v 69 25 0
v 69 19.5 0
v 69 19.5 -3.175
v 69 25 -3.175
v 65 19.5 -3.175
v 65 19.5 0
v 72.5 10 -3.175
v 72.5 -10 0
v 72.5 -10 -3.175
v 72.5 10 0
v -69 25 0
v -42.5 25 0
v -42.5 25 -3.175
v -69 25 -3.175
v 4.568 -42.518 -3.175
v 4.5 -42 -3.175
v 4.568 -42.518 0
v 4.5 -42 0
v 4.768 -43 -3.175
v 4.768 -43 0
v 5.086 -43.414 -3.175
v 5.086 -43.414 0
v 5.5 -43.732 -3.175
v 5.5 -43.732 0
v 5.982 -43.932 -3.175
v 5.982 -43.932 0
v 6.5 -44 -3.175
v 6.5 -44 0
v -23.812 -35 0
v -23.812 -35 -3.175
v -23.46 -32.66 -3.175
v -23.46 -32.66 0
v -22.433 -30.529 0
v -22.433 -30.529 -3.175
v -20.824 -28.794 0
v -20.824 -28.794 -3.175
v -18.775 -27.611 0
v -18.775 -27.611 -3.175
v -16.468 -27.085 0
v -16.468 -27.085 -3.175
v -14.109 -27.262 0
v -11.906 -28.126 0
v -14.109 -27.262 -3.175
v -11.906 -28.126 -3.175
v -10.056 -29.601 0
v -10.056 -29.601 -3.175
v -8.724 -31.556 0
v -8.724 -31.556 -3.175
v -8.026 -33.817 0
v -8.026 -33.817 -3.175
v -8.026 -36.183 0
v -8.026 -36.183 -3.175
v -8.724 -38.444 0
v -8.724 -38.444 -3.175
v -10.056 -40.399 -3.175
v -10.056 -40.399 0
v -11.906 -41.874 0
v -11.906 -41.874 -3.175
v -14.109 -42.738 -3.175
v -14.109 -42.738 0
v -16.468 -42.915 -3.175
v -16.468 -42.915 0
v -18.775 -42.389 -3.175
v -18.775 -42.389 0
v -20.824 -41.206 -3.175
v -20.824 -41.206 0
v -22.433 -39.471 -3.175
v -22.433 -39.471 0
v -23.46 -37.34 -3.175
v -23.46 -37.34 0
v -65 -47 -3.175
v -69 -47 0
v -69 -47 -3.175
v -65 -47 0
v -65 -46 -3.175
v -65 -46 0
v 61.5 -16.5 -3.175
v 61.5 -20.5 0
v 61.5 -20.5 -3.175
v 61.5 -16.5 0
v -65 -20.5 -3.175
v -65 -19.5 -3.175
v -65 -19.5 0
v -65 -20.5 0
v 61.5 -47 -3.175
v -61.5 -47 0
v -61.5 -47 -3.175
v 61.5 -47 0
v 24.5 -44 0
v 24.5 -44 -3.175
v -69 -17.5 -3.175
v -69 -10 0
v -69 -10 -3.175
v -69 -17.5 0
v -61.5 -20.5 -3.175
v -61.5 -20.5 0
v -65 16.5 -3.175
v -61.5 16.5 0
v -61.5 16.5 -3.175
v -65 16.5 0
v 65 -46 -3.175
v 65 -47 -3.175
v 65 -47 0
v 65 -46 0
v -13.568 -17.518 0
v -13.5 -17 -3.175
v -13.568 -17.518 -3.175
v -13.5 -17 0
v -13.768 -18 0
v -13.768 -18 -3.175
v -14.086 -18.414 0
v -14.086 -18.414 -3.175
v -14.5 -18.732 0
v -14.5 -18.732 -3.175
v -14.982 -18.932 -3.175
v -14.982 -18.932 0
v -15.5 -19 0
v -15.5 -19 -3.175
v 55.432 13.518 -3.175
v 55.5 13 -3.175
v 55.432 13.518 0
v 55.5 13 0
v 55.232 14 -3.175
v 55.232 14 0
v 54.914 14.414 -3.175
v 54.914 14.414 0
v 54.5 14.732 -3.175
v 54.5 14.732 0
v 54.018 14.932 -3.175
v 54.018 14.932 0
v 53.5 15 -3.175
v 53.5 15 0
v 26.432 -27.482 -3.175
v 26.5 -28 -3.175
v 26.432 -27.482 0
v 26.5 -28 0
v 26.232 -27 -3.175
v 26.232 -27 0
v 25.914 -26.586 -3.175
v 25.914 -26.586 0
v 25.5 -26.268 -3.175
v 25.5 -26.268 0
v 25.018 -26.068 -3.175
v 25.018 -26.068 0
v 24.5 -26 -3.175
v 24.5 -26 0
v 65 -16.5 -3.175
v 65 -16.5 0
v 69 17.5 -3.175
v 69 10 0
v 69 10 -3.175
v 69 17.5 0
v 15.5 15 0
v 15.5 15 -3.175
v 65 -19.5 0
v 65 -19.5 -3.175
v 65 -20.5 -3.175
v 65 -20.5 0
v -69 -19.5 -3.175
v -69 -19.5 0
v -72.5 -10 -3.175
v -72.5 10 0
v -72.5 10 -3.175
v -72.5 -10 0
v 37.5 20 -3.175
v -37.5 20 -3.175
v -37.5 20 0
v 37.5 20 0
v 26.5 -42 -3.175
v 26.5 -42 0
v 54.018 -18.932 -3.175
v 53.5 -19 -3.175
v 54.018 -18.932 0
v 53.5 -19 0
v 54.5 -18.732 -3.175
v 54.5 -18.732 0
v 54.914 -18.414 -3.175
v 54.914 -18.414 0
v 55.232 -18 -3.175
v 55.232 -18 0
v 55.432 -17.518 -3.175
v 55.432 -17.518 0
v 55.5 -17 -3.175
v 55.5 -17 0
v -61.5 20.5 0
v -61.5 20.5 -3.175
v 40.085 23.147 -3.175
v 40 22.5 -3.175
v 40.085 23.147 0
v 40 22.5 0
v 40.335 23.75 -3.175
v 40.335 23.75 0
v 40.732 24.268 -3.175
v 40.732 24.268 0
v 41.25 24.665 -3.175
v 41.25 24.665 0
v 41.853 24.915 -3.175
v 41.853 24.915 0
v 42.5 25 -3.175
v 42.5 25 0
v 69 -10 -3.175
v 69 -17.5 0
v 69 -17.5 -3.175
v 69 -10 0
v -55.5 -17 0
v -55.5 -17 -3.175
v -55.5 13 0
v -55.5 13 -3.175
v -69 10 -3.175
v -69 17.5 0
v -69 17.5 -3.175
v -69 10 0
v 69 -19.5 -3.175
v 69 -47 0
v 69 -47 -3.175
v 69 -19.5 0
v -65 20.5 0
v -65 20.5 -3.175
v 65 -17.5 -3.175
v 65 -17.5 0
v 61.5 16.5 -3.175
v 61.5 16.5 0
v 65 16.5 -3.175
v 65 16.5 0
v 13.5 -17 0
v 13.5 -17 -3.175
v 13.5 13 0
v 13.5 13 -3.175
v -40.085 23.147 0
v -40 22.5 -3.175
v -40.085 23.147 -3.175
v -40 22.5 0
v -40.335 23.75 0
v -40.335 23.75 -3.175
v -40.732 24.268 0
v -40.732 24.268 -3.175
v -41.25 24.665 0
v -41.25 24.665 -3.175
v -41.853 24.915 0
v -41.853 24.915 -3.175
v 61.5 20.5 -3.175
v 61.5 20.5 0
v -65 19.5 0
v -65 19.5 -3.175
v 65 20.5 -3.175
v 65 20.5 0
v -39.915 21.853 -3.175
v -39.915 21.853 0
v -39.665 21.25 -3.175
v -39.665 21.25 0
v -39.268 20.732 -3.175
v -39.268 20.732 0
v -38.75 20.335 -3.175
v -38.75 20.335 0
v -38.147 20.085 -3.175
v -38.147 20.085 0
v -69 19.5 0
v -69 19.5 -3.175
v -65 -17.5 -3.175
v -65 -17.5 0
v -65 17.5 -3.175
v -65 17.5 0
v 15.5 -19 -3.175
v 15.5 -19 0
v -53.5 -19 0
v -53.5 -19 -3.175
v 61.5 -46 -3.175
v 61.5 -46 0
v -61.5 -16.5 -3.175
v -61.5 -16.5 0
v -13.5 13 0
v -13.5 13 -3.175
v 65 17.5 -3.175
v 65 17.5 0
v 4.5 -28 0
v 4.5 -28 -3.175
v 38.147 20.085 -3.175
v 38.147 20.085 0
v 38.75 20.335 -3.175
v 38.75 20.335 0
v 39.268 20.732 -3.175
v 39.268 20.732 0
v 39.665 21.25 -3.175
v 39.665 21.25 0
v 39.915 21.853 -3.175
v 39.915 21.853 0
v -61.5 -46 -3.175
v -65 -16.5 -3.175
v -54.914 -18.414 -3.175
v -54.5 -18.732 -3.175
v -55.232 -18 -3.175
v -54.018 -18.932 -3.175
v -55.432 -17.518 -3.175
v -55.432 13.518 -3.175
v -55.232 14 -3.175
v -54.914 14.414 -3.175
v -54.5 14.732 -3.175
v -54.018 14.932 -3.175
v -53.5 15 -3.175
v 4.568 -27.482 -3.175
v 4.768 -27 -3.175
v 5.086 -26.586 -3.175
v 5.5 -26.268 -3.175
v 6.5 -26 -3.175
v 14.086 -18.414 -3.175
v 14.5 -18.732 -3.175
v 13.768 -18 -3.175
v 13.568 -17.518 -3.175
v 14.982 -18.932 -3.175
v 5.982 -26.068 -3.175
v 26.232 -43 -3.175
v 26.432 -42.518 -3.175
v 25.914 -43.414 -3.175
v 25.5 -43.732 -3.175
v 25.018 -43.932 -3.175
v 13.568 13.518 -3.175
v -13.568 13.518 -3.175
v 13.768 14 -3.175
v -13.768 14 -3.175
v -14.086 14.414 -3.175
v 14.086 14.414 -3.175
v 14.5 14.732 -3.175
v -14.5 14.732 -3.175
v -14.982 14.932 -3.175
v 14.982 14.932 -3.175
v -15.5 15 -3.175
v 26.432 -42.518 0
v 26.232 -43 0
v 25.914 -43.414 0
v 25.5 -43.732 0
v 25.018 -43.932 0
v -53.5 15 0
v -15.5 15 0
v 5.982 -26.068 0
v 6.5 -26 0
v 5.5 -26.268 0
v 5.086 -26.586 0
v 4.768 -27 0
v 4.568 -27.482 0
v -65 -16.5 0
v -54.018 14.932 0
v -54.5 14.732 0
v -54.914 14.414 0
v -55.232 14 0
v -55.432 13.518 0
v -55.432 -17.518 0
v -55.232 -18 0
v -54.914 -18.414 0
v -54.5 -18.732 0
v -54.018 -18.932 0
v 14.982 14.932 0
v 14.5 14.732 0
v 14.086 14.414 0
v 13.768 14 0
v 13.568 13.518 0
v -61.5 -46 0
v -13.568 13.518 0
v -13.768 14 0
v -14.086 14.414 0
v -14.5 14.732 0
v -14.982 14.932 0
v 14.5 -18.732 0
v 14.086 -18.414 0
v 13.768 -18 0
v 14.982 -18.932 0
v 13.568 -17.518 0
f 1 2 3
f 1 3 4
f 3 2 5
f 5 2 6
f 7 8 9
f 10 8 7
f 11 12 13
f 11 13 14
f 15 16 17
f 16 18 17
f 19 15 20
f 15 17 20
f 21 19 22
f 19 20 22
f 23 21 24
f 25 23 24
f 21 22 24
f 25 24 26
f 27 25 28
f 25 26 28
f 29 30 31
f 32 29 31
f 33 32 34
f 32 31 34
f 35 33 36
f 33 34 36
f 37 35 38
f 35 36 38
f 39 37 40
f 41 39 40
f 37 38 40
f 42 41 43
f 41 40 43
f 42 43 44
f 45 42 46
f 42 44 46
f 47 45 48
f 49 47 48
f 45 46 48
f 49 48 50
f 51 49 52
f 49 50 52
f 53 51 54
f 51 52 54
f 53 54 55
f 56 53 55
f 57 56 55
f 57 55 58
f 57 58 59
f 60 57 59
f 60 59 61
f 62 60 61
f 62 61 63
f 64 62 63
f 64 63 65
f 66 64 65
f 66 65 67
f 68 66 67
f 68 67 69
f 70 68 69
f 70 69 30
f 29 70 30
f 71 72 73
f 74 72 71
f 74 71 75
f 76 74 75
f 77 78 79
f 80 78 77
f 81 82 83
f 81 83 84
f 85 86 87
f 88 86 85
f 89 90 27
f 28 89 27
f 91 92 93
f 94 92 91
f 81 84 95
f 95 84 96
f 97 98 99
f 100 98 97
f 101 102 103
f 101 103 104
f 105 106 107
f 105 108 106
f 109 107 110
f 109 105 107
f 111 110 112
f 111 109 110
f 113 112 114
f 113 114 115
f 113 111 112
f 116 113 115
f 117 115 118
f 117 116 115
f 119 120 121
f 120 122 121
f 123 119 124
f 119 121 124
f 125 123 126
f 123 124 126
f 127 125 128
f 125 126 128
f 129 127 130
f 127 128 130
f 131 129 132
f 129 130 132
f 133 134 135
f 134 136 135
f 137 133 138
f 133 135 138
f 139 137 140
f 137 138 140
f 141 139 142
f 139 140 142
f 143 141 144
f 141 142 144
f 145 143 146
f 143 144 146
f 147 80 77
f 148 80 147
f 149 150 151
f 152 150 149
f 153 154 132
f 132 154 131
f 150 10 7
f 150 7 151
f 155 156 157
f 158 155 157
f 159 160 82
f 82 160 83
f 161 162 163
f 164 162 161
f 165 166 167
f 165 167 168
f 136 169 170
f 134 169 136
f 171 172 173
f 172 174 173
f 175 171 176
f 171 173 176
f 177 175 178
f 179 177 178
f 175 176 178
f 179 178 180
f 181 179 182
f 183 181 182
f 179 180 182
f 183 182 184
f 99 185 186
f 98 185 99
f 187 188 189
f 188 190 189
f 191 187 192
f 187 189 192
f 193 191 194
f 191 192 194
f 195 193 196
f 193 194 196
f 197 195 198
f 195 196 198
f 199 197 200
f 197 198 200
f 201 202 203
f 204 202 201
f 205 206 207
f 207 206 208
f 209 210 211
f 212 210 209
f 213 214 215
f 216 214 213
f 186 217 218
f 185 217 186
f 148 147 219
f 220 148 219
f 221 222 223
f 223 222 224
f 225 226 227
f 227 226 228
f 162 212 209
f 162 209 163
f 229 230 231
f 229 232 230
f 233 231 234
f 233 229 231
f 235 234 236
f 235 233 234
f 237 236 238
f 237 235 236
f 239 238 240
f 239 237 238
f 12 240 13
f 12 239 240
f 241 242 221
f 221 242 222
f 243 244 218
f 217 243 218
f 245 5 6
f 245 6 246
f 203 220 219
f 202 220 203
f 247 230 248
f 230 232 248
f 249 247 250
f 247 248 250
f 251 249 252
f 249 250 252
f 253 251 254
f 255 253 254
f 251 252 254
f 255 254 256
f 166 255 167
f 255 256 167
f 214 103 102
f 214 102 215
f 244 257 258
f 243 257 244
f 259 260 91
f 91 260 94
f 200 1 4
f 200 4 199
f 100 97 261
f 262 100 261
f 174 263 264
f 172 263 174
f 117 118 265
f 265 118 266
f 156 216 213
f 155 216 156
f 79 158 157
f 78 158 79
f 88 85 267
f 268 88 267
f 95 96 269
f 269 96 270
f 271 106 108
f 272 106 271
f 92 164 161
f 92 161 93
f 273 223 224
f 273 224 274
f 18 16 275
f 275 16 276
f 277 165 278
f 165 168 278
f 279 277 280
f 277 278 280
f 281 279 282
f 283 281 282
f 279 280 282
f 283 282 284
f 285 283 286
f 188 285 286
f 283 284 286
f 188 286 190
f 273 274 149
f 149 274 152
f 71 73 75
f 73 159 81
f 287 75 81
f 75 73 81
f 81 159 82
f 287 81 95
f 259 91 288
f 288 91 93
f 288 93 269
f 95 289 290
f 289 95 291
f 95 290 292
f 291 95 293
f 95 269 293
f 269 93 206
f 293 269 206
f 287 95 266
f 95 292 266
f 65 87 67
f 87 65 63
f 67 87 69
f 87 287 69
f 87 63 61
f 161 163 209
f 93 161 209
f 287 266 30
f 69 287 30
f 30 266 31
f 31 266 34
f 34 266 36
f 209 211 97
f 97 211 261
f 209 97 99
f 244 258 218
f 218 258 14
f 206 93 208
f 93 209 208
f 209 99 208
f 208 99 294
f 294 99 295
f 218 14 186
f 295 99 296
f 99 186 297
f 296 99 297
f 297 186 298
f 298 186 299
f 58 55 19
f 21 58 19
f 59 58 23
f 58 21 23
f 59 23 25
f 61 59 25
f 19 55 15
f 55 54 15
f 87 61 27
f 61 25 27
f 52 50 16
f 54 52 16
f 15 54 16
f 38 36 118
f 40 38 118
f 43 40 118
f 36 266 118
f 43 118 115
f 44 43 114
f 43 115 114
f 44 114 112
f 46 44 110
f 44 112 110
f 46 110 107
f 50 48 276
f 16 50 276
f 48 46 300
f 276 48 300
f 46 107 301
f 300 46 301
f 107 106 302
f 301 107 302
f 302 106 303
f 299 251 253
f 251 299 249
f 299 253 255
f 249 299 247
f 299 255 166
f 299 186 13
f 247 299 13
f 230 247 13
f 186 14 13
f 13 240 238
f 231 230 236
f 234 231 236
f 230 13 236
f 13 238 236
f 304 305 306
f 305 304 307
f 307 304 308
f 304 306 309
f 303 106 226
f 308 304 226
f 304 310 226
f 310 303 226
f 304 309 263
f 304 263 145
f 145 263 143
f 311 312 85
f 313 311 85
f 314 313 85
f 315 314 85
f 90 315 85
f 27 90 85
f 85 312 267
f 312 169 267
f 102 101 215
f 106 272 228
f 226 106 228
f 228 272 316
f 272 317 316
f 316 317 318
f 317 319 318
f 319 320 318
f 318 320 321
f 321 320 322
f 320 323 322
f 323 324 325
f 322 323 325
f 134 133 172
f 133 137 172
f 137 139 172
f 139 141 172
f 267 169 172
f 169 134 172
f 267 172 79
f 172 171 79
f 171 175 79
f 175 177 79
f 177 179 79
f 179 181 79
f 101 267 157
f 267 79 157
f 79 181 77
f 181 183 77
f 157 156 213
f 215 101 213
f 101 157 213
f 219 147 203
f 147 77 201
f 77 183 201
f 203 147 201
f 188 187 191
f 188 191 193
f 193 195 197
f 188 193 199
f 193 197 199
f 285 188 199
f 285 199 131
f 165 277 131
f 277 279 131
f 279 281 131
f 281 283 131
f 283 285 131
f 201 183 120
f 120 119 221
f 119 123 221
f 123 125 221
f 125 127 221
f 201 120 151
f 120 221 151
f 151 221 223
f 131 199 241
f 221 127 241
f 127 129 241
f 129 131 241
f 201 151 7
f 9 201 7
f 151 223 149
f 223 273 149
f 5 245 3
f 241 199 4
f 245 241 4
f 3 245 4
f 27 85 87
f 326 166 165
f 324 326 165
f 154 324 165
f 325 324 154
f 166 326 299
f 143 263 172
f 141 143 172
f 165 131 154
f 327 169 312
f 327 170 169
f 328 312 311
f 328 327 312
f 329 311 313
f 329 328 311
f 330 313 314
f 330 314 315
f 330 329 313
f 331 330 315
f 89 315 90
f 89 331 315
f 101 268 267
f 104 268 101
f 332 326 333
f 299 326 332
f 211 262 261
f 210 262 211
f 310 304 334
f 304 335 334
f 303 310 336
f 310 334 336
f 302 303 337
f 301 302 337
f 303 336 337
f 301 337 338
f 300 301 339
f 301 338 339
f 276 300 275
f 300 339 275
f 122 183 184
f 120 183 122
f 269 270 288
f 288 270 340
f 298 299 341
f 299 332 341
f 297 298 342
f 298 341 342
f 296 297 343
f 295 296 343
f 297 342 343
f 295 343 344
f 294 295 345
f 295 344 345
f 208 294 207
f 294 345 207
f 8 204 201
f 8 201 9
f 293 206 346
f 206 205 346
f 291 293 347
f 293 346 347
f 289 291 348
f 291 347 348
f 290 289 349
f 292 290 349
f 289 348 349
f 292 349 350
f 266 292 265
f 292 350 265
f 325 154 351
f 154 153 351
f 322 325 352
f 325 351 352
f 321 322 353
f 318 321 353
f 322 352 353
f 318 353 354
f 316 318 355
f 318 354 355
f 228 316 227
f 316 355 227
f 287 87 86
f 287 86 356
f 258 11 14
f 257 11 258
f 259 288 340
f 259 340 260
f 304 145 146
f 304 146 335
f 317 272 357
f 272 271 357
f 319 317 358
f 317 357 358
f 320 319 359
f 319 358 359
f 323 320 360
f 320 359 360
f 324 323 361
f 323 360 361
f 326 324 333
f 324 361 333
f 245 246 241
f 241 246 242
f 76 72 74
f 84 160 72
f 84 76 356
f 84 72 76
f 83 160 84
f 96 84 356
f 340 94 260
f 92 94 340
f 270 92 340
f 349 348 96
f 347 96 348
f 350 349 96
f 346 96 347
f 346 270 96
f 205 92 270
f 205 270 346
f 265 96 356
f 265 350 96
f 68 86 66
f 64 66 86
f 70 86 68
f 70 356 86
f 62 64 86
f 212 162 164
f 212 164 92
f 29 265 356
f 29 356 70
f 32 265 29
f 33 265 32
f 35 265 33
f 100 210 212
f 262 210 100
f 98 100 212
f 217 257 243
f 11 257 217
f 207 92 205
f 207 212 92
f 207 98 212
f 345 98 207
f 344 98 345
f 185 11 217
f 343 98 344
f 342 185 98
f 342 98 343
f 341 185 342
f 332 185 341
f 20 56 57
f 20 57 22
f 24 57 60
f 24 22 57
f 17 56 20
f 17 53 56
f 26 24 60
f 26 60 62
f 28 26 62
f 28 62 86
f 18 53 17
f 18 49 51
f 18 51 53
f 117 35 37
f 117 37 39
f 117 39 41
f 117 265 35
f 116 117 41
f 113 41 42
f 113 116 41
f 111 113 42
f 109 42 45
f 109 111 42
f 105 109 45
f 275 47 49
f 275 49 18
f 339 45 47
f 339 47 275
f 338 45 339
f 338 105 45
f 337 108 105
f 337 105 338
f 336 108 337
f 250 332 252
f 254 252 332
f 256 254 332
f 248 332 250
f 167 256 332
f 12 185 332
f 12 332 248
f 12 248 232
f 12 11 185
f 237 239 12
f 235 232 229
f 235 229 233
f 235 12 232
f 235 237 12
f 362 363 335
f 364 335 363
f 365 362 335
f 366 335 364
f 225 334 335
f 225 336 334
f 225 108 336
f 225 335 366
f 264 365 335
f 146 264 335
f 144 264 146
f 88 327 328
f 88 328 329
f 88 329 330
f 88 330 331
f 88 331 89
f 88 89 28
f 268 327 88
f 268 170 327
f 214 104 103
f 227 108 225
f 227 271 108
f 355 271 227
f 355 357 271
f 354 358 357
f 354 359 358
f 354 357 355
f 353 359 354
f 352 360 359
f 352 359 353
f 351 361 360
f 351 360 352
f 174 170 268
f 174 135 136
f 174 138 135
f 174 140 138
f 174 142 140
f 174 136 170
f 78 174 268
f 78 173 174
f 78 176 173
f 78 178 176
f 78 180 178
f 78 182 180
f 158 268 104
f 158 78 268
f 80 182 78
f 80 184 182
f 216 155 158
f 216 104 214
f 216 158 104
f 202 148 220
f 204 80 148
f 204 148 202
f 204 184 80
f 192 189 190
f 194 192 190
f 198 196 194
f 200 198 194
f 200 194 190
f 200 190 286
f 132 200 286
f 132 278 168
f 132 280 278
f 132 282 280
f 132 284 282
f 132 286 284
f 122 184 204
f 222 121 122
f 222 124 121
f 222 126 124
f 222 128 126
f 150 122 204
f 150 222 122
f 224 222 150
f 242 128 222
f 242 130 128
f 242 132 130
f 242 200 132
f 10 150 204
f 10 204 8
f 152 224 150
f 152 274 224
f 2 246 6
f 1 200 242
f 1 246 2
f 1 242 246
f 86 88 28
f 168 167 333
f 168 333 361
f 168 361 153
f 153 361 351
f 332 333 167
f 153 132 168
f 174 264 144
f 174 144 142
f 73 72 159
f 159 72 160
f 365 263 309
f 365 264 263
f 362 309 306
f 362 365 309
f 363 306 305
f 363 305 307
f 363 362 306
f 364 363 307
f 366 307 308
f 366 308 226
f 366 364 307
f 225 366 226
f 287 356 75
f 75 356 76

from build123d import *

# Parameters (mm, degrees)
BOSS_EXTRUDE1_DEPTH     = 3.175
CUT_EXTRUDE1_DEPTH      = 82.916607748
MIRROR2_COPY_1_DEPTH    = 82.916607748
SKETCH4_W               = 138
SKETCH4_H               = 9
BOSS_EXTRUDE3_DEPTH     = 3.175
CUT_EXTRUDE2_DEPTH      = 87.459994362
CUT_EXTRUDE2_DEPTH_BACK = 87.459994362
SKETCH5_W               = 80
SKETCH5_H               = 5
FILLET1_R               = 2.5
SKETCH6_W               = 3.5
SKETCH6_H               = 1
CUT_EXTRUDE3_DEPTH      = 87.459994362
SKETCH10_W              = 42
SKETCH10_H              = 34
CUT_EXTRUDE4_DEPTH      = 87.459994362
FILLET2_R               = 2
FILLET2_OF_MIRROR4_R    = 2
SKETCH11_R              = 7.9375
CUT_EXTRUDE5_DEPTH      = 10
SKETCH12_W              = 22
SKETCH12_H              = 18
CUT_EXTRUDE6_DEPTH      = 10
FILLET3_R               = 2


with BuildPart() as part:
    # Sketch1 → Boss-Extrude1 (new body)
    with BuildSketch(Plane.XY):
        Polygon((-69, -10), (-69, -38), (69, -38), (69, -10), (72.5, -10), (72.5, 10), (69, 10), (69, 25), (-69, 25), (-69, 10), (-72.5, 10), (-72.5, -10), align=None)
    extrude(amount=-BOSS_EXTRUDE1_DEPTH)

    # Sketch2 → Cut-Extrude1 (cut, symmetric)
    with BuildSketch(Plane.XY):
        Polygon((-69, 19.5), (-65, 19.5), (-65, 20.5), (-61.5, 20.5), (-61.5, 16.5), (-65, 16.5), (-65, 17.5), (-69, 17.5), align=None)
    cut_extrude1 = extrude(amount=CUT_EXTRUDE1_DEPTH, both=True, mode=Mode.SUBTRACT)

    # Mirror1: Cut-Extrude1 across plane
    add(cut_extrude1.mirror(Plane.ZY), mode=Mode.SUBTRACT)

    # Mirror2: Cut-Extrude1 across plane
    add(cut_extrude1.mirror(Plane.ZX), mode=Mode.SUBTRACT)

    # Mirror2 copy 1 sketch → Mirror2 copy 1 (cut, symmetric)
    with BuildSketch(Plane(origin=(0, 0, 0), x_dir=(-1, 0, 0), z_dir=(0, 0, 1))):
        Polygon((-69, 19.5), (-65, 19.5), (-65, 20.5), (-61.5, 20.5), (-61.5, 16.5), (-65, 16.5), (-65, 17.5), (-69, 17.5), align=None)
    extrude(amount=MIRROR2_COPY_1_DEPTH, both=True, mode=Mode.SUBTRACT)

    # Sketch4 → Boss-Extrude3 (add)
    with BuildSketch(Plane.XY):
        with Locations((0, -42.5)):
            Rectangle(SKETCH4_W, SKETCH4_H)
    extrude(amount=-BOSS_EXTRUDE3_DEPTH)

    # Sketch5 → Cut-Extrude2 (cut, two sides: drawn at the far end of the back side and taken through both)
    with BuildSketch(Plane.XY.offset(-CUT_EXTRUDE2_DEPTH_BACK)):
        with Locations((0, 22.5)):
            Rectangle(SKETCH5_W, SKETCH5_H)
    extrude(amount=CUT_EXTRUDE2_DEPTH + CUT_EXTRUDE2_DEPTH_BACK, mode=Mode.SUBTRACT)

    # Fillet1
    fillet1_edges = [part.edges().sort_by_distance(p)[0] for p in [
        (40, 20, -1.5875),
        (-40, 20, -1.5875),
    ]]
    fillet(fillet1_edges, radius=FILLET1_R)
    fillet1_2_edges = [part.edges().sort_by_distance(p)[0] for p in [
        (40, 25, -1.5875),
        (-40, 25, -1.5875),
    ]]
    fillet(fillet1_2_edges, radius=FILLET1_R - 0.0001)  # a hair under: the kernel refuses the full size

    # Sketch6 → Cut-Extrude3 (cut, symmetric)
    with BuildSketch(Plane.XY):
        with Locations((63.25, -46.5)):
            Rectangle(SKETCH6_W, SKETCH6_H)
    cut_extrude3 = extrude(amount=CUT_EXTRUDE3_DEPTH, both=True, mode=Mode.SUBTRACT)

    # Mirror3: Cut-Extrude3 across plane
    add(cut_extrude3.mirror(Plane.ZY), mode=Mode.SUBTRACT)

    # Sketch10 → Cut-Extrude4 (cut, through all)
    with BuildSketch(Plane(origin=(0, 0, -3.175), x_dir=(-1, 0, 0), z_dir=(0, 0, -1))):
        with Locations((34.5, -2)):
            Rectangle(SKETCH10_W, SKETCH10_H)
    cut_extrude4 = extrude(amount=-CUT_EXTRUDE4_DEPTH, mode=Mode.SUBTRACT)

    # Fillet2
    fillet2_edges = [part.edges().sort_by_distance(p)[0] for p in [
        (-55.5, 15, -1.5875),
        (-55.5, -19, -1.5875),
        (-13.5, -19, -1.5875),
        (-13.5, 15, -1.5875),
    ]]
    fillet(fillet2_edges, radius=FILLET2_R)

    # Mirror4: Cut-Extrude4 across plane
    add(cut_extrude4.mirror(Plane.ZY), mode=Mode.SUBTRACT)

    # Fillet2 of Mirror4
    fillet2_of_mirror4_edges = [part.edges().sort_by_distance(p)[0] for p in [
        (55.5, 15, -1.5875),
        (55.5, -19, -1.5875),
        (13.5, -19, -1.5875),
        (13.5, 15, -1.5875),
    ]]
    fillet(fillet2_of_mirror4_edges, radius=FILLET2_OF_MIRROR4_R)

    # Sketch11 → Cut-Extrude5 (cut)
    with BuildSketch(Plane(origin=(0, 0, -3.175), x_dir=(-1, 0, 0), z_dir=(0, 0, -1))):
        with Locations((15.875, -35)):
            Circle(SKETCH11_R)
    extrude(amount=-CUT_EXTRUDE5_DEPTH, mode=Mode.SUBTRACT)

    # Sketch12 → Cut-Extrude6 (cut)
    with BuildSketch(Plane(origin=(0, 0, -3.175), x_dir=(-1, 0, 0), z_dir=(0, 0, -1))):
        with Locations((-15.5, -35)):
            Rectangle(SKETCH12_W, SKETCH12_H)
    extrude(amount=-CUT_EXTRUDE6_DEPTH, mode=Mode.SUBTRACT)

    # Fillet3
    fillet3_edges = [part.edges().sort_by_distance(p)[0] for p in [
        (4.5, -26, -1.5875),
        (4.5, -44, -1.5875),
        (26.5, -44, -1.5875),
        (26.5, -26, -1.5875),
    ]]
    fillet(fillet3_edges, radius=FILLET3_R)


solid = part.part
